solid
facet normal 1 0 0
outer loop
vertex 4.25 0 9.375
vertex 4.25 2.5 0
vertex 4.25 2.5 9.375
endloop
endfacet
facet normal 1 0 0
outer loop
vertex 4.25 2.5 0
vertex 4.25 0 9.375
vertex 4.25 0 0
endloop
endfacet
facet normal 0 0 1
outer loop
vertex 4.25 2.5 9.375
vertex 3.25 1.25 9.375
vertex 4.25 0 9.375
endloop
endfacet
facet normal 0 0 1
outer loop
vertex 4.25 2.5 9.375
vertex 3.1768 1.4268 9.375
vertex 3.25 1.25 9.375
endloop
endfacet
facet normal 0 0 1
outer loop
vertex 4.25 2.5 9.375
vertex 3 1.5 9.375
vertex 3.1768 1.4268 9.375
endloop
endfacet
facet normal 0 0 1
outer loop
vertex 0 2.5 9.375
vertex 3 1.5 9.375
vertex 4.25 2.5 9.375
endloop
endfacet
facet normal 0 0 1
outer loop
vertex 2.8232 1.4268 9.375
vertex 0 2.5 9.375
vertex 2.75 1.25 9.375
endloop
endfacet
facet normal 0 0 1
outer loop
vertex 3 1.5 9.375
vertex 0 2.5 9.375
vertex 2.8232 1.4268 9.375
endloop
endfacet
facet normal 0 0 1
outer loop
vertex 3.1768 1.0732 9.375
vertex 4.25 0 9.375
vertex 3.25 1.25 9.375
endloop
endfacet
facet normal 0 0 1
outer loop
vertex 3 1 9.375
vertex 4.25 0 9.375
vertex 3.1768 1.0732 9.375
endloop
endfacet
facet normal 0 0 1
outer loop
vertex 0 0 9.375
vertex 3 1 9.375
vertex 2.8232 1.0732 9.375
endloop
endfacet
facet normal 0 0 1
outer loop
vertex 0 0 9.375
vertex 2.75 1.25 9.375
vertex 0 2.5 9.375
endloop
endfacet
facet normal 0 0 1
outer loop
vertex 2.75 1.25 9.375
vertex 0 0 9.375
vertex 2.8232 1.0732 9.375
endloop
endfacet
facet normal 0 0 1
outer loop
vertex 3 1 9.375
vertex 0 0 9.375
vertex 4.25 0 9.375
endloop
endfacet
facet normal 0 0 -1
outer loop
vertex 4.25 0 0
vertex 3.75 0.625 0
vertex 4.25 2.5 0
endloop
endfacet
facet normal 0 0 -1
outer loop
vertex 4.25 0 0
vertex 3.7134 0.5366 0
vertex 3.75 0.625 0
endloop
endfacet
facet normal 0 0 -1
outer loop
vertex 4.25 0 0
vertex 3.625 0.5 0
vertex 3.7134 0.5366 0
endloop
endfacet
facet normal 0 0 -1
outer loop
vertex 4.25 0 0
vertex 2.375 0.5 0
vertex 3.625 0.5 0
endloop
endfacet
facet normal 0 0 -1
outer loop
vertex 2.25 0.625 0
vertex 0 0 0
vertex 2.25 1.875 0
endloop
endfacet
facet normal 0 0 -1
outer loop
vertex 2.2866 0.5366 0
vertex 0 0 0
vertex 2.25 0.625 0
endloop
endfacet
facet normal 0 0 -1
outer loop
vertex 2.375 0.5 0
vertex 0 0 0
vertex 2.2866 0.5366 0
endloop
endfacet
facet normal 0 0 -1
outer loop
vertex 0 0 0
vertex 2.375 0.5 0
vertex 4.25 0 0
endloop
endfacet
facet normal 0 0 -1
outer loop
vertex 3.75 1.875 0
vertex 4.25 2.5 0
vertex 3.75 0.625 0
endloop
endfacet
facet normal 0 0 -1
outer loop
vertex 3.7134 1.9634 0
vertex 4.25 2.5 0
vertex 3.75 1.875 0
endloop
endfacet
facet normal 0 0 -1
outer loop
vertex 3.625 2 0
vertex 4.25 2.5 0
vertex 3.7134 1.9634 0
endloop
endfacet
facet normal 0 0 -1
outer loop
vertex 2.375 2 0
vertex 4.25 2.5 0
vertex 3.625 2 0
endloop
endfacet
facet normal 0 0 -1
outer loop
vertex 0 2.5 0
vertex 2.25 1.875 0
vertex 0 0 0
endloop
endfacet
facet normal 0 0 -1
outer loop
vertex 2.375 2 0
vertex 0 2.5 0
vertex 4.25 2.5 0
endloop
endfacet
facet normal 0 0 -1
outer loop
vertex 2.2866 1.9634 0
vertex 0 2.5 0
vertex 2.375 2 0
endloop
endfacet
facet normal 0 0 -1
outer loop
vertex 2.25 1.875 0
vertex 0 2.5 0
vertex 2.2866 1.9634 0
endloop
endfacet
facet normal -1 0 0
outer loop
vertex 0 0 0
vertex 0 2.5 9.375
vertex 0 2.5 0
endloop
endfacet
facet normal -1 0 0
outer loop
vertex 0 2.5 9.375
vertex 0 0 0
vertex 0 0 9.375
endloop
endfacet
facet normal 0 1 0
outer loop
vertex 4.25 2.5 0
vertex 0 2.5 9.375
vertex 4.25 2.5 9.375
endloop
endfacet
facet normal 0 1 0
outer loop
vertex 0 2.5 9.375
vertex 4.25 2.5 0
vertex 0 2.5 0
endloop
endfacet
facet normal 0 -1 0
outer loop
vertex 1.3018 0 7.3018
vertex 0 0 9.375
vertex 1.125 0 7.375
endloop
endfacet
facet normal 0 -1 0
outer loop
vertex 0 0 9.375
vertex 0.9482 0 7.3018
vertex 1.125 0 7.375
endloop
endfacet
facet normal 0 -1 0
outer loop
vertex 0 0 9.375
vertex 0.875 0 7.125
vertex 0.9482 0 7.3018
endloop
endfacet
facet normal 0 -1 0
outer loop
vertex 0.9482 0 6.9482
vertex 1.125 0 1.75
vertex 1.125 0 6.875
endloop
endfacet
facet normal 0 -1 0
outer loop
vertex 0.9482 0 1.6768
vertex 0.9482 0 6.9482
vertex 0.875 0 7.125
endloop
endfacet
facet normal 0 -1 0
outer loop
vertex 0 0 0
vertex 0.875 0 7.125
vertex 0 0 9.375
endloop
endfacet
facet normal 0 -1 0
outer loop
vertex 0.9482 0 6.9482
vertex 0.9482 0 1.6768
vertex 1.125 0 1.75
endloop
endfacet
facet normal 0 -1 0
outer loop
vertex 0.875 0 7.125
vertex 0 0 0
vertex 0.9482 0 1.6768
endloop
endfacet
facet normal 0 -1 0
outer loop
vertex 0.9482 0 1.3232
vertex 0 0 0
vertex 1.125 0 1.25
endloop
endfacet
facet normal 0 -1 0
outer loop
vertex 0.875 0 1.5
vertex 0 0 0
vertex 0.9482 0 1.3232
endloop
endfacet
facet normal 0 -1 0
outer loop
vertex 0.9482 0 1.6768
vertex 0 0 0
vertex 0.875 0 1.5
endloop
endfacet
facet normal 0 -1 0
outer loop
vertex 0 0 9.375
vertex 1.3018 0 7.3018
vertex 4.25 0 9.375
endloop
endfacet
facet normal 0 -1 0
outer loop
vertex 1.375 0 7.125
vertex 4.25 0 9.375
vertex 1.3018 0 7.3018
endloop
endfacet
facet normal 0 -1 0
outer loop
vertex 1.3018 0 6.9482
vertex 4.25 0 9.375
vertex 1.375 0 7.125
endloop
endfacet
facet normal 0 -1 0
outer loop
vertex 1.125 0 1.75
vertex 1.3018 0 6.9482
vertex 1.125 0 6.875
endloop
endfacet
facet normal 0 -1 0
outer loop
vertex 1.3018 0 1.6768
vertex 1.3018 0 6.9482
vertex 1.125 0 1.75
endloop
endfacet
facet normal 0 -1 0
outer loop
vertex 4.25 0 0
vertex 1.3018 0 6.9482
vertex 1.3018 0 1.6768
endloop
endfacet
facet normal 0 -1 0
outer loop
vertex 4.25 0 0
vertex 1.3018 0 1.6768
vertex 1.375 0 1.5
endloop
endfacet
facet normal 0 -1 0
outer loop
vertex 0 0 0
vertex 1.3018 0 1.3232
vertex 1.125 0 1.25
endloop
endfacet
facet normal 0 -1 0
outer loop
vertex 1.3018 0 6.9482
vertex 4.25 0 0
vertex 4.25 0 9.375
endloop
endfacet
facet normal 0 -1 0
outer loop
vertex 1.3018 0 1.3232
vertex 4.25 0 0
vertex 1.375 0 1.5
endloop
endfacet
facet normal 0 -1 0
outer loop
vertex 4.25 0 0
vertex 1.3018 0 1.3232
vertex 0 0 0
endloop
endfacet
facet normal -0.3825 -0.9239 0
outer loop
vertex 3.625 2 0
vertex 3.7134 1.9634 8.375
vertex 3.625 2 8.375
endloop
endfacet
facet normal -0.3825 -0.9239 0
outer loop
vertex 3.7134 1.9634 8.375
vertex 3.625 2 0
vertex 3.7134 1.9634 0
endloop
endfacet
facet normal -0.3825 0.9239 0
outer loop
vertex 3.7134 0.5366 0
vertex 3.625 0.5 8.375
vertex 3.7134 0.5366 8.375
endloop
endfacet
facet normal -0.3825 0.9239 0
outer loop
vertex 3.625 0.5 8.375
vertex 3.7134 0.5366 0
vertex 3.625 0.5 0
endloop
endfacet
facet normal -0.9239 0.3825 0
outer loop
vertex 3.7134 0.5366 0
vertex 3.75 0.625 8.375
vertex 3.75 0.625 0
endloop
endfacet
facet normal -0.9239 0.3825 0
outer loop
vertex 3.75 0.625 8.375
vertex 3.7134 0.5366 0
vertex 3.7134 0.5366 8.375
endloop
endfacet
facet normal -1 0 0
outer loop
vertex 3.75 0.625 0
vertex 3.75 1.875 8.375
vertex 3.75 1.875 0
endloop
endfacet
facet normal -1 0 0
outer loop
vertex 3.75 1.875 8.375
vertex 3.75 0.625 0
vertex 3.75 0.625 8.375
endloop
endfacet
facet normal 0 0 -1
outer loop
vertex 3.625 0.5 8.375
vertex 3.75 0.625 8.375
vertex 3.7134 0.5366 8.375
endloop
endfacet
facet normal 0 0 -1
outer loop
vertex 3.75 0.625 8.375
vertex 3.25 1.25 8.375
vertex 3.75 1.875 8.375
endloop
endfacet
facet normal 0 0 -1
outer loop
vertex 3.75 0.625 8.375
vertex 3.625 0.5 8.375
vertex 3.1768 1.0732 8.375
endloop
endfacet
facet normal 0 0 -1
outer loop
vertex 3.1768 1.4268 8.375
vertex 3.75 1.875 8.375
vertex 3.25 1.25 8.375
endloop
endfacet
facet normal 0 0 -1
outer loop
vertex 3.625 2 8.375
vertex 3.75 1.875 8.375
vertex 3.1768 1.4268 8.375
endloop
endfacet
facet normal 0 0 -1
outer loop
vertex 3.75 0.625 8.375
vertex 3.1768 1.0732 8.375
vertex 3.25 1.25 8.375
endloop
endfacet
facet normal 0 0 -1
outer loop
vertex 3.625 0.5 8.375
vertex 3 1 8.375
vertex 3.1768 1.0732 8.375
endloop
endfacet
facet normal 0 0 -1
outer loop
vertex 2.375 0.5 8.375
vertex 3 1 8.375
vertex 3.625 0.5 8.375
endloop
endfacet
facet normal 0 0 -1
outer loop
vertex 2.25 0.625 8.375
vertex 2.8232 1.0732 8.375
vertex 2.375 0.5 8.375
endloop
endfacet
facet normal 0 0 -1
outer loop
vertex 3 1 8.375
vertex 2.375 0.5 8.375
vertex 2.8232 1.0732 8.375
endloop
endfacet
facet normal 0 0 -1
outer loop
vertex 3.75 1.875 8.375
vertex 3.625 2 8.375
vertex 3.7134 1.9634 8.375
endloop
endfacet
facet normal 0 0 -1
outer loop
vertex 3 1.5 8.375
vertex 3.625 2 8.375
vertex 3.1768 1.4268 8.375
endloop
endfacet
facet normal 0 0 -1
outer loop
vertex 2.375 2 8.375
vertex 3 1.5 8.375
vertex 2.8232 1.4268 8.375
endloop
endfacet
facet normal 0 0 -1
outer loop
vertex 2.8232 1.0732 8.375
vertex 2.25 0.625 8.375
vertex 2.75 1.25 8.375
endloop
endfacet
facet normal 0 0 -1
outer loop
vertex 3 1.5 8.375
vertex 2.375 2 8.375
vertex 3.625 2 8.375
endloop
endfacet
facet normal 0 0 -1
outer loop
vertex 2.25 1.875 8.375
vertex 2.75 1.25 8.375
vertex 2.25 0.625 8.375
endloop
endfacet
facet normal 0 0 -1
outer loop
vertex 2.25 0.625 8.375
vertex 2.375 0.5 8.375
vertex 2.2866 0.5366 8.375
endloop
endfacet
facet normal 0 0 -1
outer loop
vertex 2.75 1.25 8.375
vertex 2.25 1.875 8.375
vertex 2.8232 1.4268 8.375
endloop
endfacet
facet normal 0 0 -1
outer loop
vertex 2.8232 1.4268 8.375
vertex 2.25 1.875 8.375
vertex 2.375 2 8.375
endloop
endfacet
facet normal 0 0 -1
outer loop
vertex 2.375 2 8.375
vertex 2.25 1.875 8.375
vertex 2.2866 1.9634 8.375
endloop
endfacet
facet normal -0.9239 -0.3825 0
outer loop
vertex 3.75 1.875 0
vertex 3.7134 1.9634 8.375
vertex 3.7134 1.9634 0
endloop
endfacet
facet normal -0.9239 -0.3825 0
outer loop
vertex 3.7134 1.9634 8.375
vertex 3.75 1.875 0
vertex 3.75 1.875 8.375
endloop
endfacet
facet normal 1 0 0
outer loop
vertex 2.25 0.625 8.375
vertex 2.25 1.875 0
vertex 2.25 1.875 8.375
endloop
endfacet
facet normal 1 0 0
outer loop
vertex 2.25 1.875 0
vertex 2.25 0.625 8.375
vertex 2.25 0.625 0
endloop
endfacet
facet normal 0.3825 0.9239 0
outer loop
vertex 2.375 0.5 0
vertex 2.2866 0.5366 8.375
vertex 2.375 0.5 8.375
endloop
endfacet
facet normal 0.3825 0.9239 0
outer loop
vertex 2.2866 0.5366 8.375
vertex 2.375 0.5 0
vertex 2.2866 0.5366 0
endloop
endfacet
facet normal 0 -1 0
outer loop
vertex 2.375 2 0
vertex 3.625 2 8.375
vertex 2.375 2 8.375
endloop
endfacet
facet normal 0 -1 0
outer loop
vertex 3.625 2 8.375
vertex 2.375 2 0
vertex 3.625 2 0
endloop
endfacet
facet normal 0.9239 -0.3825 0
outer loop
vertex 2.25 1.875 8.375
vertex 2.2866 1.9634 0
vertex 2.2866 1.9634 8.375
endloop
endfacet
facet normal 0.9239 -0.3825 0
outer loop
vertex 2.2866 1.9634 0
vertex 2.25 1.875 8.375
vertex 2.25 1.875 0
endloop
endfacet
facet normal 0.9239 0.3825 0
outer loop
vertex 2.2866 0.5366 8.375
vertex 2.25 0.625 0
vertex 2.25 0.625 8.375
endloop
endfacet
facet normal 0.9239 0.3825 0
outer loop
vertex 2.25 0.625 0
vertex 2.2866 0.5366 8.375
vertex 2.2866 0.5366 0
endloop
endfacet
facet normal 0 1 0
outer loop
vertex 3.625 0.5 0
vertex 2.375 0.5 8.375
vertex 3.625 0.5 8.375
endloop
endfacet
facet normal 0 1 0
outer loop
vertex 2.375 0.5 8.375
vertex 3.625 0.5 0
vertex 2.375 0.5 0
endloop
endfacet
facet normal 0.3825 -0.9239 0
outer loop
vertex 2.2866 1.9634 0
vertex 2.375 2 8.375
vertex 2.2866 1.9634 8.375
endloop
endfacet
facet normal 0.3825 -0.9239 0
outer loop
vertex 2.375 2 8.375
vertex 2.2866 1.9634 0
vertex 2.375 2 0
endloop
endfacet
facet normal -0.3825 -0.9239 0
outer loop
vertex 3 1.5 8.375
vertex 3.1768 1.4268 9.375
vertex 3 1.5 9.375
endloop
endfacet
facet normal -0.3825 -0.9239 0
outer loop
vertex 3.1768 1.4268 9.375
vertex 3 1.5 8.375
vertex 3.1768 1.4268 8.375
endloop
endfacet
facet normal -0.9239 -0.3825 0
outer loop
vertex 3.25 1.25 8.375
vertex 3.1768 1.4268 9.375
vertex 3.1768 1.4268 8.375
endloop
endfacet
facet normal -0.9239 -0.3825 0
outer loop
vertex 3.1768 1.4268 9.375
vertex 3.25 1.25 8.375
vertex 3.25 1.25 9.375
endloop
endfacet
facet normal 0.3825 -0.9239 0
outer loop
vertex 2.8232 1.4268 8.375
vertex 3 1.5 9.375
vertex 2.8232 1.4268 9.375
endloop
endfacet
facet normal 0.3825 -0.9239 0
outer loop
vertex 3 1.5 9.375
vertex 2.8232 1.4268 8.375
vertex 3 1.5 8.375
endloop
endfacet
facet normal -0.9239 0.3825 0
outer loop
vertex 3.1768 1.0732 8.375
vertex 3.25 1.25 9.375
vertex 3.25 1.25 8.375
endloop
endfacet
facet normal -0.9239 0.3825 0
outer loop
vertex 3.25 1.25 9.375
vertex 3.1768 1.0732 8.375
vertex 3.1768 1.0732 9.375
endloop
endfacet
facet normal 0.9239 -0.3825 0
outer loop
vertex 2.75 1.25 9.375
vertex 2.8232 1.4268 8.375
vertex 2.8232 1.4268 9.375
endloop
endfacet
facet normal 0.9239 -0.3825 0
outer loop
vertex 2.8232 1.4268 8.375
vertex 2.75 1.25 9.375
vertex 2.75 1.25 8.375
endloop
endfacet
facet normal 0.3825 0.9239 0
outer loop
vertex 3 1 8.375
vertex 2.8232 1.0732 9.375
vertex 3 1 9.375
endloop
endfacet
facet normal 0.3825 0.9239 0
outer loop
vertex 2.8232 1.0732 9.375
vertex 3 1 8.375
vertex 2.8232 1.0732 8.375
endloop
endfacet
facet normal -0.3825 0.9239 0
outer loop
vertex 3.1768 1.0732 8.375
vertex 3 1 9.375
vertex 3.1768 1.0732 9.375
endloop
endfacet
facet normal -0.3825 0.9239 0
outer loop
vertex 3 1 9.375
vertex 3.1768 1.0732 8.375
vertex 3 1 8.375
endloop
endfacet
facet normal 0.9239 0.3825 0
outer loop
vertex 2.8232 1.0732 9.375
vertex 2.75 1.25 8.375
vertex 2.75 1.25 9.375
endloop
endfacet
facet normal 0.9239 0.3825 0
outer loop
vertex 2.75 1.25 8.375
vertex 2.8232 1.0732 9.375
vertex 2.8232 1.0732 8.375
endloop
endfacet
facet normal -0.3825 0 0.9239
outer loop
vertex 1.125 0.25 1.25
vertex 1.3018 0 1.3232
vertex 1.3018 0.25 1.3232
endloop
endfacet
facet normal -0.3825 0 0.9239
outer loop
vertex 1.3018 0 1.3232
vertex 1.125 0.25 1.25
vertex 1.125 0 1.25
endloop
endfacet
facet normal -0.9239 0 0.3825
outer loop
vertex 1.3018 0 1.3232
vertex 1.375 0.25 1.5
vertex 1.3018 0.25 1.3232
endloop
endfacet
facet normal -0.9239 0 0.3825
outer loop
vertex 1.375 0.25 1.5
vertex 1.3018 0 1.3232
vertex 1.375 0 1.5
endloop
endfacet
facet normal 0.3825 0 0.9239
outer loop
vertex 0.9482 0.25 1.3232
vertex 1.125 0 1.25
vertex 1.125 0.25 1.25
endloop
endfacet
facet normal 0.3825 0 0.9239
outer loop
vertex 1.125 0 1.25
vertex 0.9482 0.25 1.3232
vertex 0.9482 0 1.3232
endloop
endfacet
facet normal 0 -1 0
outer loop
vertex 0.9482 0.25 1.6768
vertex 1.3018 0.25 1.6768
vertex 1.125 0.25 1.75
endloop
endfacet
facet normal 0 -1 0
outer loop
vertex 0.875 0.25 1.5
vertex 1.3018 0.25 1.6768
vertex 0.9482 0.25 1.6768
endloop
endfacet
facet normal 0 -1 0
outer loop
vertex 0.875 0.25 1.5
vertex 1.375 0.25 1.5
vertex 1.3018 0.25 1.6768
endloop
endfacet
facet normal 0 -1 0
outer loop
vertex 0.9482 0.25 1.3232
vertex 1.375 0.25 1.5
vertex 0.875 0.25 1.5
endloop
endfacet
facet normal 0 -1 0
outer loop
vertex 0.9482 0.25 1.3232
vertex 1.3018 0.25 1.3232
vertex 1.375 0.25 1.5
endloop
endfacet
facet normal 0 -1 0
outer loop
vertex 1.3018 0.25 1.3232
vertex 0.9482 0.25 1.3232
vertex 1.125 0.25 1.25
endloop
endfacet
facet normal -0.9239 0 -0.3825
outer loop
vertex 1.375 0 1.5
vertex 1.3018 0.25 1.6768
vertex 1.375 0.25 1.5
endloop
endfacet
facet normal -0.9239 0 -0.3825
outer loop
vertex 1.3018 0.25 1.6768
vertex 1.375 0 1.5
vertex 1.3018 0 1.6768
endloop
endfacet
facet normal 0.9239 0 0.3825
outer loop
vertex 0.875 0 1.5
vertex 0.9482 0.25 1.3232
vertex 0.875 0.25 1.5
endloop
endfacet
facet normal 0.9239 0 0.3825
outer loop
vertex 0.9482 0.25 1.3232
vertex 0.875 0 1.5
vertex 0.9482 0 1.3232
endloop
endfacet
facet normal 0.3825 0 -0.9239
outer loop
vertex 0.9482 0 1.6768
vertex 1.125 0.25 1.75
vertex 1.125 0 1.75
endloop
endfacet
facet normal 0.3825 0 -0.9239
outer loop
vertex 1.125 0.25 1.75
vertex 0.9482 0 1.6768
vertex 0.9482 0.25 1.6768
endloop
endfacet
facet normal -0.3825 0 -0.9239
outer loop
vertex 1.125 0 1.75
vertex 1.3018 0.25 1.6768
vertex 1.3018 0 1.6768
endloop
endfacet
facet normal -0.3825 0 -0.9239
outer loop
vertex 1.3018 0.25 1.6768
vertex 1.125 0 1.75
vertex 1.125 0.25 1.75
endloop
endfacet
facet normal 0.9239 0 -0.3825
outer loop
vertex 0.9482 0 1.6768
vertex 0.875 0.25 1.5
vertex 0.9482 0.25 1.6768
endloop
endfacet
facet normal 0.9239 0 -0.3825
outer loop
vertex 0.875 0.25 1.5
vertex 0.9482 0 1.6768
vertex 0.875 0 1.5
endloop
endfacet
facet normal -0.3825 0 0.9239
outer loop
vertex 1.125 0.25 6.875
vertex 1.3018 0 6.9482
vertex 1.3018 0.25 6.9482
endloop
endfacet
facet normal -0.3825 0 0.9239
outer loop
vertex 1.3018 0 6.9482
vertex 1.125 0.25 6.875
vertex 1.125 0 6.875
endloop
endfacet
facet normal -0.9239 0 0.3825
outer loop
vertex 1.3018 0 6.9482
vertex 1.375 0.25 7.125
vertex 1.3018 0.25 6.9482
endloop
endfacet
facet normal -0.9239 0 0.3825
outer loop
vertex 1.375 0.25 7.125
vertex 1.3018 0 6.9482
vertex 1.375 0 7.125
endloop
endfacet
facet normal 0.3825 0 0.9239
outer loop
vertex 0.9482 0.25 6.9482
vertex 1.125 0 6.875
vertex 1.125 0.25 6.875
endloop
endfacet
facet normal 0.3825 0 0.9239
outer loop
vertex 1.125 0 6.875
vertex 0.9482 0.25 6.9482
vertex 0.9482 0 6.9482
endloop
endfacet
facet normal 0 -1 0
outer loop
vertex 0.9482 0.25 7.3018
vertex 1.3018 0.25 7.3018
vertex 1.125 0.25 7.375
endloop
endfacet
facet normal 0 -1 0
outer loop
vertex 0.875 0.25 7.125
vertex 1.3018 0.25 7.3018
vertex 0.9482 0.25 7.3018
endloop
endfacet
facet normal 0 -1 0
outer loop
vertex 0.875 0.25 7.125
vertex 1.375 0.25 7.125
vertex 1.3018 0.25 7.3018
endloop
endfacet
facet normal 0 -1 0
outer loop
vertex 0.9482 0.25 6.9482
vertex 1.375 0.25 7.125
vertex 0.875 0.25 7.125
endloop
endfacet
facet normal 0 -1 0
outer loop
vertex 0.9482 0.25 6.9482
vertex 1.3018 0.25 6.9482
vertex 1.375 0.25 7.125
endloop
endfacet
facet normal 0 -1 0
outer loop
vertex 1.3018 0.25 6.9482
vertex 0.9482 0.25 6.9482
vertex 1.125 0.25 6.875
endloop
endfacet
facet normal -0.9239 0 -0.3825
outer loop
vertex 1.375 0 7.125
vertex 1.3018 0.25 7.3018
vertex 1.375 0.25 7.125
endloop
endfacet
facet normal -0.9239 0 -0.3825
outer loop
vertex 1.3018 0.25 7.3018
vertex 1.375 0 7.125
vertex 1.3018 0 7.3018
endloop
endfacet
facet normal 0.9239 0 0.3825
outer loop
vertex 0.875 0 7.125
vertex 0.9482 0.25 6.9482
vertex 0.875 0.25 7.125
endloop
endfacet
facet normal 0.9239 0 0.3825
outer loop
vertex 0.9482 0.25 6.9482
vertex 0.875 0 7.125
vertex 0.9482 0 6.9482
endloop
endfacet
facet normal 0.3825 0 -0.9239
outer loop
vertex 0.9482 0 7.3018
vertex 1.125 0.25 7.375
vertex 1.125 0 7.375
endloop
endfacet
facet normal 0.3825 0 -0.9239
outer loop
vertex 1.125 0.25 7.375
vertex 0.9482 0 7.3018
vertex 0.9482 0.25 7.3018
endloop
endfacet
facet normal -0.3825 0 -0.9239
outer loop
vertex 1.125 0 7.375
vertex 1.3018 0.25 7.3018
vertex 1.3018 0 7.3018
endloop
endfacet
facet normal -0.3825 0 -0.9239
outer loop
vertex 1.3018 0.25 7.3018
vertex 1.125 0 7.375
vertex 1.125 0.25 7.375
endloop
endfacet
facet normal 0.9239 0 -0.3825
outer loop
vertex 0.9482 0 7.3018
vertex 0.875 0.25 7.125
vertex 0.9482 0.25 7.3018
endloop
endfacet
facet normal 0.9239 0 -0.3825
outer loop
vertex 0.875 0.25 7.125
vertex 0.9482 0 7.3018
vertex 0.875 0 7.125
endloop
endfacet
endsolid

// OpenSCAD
// file: TTvars.scad
$fn=8; //default 36

barX=0.25;
barZ=6;
barLY=108;
barLX=60;

angX=1.5;
angT=0.125;
angLY=barLY;
angLX=barLX;
angR=0.25;

cornerSQ=1.5; //size of square tubing in corners
cornerSQr=0.125; //radius of square tubing 90s
cornerT=0.5; //thickness of corner mount walls
cornerBoltOD=0.5;

boltD=0.5;   // 6mm
boltL=1.968504;    // 50mm

brrOD=0.875;
brrID=0.375;
brrT=0.28125;

sprOD=0.25;

bmountGap=0.125;
bmountbrrGap=0.125;

stepBoltD=0.11811024;  //3.0mm bolt diameter
stepBoltHD=0.22362205; //5.68mm head diameter
stepBoltHH=0.11811024;  //3.0mm head height
stepBoltX=1.22047244;   //31.0mm square from bolt center to center
stepBoltIn=0.15748031;  //4.0mm bolt depth into stepper
stepSeatD=0.86614173;    //22.0mm
stepSeatH=0.07874016;    //2.0mm
stepX=1.66535433;        //42.3mm stepper square face 
stepBoreD=0.2007874;     //5.1mm shaft bore
stepBoreL=0.94488189;    //24mm

pullP=1.253;       //OD of belt around pully GT2 20T ??
pullH=0;            //Height of pulley


//calculated

Y2Y=barLX+0.0;
Y2YA=Y2Y+(((((barX+(bmountGap*2)))/2)+0.5)*2); //center to center barL
X2X=8; //distance between X rails

bmountX=barX+((brrOD+1)*2);
bmountY=X2X;
bmountZ=barZ+(1+boltD)+(brrOD/2)+(brrID/2)+(0.25)+boltD+(0.5);

xmountX=((bmountX-(barX+(bmountGap*2)))/2)+0;
xmountY=angX+barX+1.0;
// main file
include <TTvars.scad>;

TTcorner();

module TTcorner(){

difference(){    
difference(){    
cube([((bmountX-(barX+(bmountGap*2)))/2)+(cornerSQ+(cornerT*2)),cornerSQ+(cornerT*2),bmountZ]);    

//square tubing hole
translate([(-(cornerSQ-(cornerSQr*2))/2)+((bmountX-(barX+(bmountGap*2)))/2)+((cornerSQ+(cornerT*2))/2),(cornerSQ-(cornerSQr*2))/2,bmountZ-1])
mirror([0,0,1])    
minkowski(){
    cube([cornerSQ-(cornerSQr*2),cornerSQ-(cornerSQr*2),bmountZ]);
    cylinder(r=cornerSQr, h=1);
}//end minkoski
//corner bolt hole
translate([(((cornerSQ-(cornerSQr*2))/2)-(cornerSQ-(cornerSQr*2))/2)+((bmountX-(barX+(bmountGap*2)))/2)+((cornerSQ+(cornerT*2))/2),(cornerSQ-(cornerSQr*2)),bmountZ-1])
cylinder(d=cornerBoltOD, h=1);

}//end difference


//lower attach hole
translate([bmountX-(((bmountX-(barX+(bmountGap*2)))/2)/2)-(bmountX/2),-(angX+0.75),(1+boltD)])
rotate([-90,0,0])
    #cylinder(d=boltD, h=(cornerSQ+(cornerT*2)));
//upper attach hole
translate([bmountX-(((bmountX-(barX+(bmountGap*2)))/2)/2)-(bmountX/2),-(angX+0.75),barZ+(brrOD/2)+(brrID/2)+(0.25)+(boltD/2)])
rotate([-90,0,0])
    #cylinder(d=boltD, h=(cornerSQ+(cornerT*2)));


    
    

} //end difference
} //end TTcorner
